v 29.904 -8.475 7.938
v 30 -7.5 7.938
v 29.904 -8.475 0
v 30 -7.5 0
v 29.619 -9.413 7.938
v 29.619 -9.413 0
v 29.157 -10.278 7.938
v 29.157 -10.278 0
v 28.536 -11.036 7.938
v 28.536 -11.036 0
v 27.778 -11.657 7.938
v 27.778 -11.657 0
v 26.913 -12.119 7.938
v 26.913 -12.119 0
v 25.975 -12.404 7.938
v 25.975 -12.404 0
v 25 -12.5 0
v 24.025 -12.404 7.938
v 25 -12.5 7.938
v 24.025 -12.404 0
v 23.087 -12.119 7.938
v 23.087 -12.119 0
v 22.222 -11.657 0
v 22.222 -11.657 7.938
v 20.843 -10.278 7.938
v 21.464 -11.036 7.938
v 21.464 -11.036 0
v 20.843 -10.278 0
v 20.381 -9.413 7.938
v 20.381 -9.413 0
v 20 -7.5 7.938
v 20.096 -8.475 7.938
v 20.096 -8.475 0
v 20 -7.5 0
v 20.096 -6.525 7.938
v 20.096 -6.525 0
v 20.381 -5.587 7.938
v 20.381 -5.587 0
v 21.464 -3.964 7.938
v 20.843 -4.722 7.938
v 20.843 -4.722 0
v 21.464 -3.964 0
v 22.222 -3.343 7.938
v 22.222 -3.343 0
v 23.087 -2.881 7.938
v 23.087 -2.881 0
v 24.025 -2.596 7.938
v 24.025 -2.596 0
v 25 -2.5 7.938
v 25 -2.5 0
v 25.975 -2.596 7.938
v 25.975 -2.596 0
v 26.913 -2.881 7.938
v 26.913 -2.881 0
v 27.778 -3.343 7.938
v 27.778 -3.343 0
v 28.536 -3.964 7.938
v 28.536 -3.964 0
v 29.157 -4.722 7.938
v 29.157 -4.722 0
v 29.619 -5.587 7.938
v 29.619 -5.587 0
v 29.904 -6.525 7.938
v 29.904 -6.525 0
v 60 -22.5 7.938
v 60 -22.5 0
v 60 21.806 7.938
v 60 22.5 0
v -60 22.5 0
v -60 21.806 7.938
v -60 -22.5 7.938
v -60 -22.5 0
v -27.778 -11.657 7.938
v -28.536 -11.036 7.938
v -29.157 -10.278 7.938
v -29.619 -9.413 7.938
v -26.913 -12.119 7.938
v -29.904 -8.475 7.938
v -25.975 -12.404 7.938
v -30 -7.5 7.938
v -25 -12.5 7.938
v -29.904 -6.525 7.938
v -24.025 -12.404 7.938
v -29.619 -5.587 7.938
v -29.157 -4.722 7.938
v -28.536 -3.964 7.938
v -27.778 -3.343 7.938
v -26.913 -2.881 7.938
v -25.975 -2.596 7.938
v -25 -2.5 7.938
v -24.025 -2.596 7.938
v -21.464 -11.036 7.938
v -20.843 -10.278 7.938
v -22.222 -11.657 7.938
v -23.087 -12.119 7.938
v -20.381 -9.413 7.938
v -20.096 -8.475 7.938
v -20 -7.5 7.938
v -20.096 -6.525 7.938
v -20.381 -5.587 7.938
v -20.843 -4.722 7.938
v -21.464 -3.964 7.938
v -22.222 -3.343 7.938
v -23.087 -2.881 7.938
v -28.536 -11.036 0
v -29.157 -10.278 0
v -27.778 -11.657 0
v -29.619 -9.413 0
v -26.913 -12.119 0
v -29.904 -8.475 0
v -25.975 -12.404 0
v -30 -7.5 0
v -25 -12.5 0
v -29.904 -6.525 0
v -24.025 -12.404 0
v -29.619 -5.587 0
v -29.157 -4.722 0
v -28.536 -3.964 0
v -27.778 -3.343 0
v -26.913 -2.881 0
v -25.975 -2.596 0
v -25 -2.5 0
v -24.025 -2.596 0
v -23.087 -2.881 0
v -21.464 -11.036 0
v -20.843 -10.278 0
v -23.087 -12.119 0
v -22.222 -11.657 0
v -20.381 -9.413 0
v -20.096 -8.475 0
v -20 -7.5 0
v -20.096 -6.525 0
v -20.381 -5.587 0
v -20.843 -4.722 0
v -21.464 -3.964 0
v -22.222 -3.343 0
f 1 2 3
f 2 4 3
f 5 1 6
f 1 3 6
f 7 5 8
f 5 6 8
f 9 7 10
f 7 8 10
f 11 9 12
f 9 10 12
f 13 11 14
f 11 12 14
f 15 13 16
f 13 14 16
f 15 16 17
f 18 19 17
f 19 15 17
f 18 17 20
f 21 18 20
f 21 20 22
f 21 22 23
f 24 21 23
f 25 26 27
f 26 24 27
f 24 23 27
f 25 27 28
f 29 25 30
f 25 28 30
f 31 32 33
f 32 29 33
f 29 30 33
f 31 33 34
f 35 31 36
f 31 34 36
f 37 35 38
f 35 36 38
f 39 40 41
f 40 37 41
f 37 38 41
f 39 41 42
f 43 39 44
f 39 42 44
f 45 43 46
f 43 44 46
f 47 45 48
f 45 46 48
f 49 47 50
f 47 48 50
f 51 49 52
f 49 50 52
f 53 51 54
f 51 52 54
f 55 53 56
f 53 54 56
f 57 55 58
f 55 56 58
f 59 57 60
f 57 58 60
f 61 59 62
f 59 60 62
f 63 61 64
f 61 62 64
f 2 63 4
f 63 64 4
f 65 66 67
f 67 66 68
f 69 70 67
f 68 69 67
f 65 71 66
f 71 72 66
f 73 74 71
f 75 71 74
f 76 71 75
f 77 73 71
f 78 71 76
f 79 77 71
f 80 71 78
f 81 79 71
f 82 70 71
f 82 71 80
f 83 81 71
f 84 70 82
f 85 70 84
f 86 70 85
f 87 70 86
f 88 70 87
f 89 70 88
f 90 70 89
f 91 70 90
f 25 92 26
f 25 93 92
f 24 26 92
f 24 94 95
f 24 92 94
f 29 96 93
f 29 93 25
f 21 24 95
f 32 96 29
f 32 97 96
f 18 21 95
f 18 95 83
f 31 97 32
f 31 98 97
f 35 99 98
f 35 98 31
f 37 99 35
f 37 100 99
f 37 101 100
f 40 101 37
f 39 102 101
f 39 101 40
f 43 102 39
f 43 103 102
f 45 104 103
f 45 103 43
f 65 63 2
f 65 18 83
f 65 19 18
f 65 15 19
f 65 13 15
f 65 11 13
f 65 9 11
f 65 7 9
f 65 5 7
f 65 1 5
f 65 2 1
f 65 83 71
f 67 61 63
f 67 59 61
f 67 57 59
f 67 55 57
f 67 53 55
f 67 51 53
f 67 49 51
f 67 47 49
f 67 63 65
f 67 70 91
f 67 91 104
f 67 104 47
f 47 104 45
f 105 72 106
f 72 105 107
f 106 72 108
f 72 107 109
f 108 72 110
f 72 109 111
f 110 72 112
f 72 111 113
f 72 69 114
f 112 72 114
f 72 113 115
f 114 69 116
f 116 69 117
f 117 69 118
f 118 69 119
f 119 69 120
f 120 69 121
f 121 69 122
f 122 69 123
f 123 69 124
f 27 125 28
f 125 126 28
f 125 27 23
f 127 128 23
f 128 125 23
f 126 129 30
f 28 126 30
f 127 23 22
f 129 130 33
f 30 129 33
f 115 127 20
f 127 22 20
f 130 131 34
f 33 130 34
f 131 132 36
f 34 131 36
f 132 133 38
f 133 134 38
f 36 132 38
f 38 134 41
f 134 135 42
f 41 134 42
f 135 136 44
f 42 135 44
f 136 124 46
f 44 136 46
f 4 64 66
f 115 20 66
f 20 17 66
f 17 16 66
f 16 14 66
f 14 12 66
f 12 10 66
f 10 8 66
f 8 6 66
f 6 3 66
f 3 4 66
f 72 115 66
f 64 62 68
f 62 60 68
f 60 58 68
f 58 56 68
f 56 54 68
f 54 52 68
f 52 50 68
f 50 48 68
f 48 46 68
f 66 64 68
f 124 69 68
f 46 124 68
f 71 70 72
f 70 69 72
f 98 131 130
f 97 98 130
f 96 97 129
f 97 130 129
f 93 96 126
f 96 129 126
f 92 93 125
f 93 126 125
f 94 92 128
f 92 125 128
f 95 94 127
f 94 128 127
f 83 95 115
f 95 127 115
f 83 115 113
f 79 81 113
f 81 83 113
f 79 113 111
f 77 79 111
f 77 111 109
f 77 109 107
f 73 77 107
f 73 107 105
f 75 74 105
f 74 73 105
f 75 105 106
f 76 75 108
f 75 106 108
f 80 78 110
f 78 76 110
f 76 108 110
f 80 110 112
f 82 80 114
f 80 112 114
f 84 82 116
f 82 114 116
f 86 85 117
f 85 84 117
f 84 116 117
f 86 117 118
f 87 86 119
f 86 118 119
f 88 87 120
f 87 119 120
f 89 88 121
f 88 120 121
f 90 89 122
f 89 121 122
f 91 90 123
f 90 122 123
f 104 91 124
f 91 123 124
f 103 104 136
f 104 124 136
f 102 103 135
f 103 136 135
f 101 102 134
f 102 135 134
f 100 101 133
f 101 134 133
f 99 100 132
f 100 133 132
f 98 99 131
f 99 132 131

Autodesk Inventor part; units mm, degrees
ref_plane "YZ Plane" through (0, 0, 0) normal (1, 0, 0) x (0, 1, 0)
ref_plane "XZ Plane" through (0, 0, 0) normal (0, 1, 0) x (-1, 0, 0)
ref_plane "XY Plane" through (0, 0, 0) normal (0, 0, 1) x (1, 0, 0)
sketch "Sketch1" plane through (0, 0, 0) normal (0, 0, 1) x (1, 0, 0)
  line L0 (-60, -22.5) -> (60, -22.5)
  line L1 (60, -22.5) -> (60, 22.5)
  line L2 (60, 22.5) -> (-60, 22.5)
  line L3 (-60, 22.5) -> (-60, -22.5)
  line L4 (-60, -22.5) -> (60, 22.5) construction
  line L5 (60, -22.5) -> (-60, 22.5) construction
  circle A0 centre (-25, -7.5) radius 5
  circle A1 centre (25, -7.5) radius 5
  point P0 (0, 0)
  dimension "d0" = 120
  dimension "d1" = 45
  dimension "d2" = 10
  dimension "d3" = 10
  dimension "d4" = 35
  dimension "d5" = 35
  dimension "d6" = 15
  dimension "d7" = 15
extrude "Extrusion1" add sketch "Sketch1" along normal blind 7.9375
chamfer "Chamfer1" distance 7.9375 angle 5 1 edges at (0, 22.5, 7.9375) measured on face at (20, 22.5, 2.6458)
properties part number "Lower blade" material "Steel, Mild"
